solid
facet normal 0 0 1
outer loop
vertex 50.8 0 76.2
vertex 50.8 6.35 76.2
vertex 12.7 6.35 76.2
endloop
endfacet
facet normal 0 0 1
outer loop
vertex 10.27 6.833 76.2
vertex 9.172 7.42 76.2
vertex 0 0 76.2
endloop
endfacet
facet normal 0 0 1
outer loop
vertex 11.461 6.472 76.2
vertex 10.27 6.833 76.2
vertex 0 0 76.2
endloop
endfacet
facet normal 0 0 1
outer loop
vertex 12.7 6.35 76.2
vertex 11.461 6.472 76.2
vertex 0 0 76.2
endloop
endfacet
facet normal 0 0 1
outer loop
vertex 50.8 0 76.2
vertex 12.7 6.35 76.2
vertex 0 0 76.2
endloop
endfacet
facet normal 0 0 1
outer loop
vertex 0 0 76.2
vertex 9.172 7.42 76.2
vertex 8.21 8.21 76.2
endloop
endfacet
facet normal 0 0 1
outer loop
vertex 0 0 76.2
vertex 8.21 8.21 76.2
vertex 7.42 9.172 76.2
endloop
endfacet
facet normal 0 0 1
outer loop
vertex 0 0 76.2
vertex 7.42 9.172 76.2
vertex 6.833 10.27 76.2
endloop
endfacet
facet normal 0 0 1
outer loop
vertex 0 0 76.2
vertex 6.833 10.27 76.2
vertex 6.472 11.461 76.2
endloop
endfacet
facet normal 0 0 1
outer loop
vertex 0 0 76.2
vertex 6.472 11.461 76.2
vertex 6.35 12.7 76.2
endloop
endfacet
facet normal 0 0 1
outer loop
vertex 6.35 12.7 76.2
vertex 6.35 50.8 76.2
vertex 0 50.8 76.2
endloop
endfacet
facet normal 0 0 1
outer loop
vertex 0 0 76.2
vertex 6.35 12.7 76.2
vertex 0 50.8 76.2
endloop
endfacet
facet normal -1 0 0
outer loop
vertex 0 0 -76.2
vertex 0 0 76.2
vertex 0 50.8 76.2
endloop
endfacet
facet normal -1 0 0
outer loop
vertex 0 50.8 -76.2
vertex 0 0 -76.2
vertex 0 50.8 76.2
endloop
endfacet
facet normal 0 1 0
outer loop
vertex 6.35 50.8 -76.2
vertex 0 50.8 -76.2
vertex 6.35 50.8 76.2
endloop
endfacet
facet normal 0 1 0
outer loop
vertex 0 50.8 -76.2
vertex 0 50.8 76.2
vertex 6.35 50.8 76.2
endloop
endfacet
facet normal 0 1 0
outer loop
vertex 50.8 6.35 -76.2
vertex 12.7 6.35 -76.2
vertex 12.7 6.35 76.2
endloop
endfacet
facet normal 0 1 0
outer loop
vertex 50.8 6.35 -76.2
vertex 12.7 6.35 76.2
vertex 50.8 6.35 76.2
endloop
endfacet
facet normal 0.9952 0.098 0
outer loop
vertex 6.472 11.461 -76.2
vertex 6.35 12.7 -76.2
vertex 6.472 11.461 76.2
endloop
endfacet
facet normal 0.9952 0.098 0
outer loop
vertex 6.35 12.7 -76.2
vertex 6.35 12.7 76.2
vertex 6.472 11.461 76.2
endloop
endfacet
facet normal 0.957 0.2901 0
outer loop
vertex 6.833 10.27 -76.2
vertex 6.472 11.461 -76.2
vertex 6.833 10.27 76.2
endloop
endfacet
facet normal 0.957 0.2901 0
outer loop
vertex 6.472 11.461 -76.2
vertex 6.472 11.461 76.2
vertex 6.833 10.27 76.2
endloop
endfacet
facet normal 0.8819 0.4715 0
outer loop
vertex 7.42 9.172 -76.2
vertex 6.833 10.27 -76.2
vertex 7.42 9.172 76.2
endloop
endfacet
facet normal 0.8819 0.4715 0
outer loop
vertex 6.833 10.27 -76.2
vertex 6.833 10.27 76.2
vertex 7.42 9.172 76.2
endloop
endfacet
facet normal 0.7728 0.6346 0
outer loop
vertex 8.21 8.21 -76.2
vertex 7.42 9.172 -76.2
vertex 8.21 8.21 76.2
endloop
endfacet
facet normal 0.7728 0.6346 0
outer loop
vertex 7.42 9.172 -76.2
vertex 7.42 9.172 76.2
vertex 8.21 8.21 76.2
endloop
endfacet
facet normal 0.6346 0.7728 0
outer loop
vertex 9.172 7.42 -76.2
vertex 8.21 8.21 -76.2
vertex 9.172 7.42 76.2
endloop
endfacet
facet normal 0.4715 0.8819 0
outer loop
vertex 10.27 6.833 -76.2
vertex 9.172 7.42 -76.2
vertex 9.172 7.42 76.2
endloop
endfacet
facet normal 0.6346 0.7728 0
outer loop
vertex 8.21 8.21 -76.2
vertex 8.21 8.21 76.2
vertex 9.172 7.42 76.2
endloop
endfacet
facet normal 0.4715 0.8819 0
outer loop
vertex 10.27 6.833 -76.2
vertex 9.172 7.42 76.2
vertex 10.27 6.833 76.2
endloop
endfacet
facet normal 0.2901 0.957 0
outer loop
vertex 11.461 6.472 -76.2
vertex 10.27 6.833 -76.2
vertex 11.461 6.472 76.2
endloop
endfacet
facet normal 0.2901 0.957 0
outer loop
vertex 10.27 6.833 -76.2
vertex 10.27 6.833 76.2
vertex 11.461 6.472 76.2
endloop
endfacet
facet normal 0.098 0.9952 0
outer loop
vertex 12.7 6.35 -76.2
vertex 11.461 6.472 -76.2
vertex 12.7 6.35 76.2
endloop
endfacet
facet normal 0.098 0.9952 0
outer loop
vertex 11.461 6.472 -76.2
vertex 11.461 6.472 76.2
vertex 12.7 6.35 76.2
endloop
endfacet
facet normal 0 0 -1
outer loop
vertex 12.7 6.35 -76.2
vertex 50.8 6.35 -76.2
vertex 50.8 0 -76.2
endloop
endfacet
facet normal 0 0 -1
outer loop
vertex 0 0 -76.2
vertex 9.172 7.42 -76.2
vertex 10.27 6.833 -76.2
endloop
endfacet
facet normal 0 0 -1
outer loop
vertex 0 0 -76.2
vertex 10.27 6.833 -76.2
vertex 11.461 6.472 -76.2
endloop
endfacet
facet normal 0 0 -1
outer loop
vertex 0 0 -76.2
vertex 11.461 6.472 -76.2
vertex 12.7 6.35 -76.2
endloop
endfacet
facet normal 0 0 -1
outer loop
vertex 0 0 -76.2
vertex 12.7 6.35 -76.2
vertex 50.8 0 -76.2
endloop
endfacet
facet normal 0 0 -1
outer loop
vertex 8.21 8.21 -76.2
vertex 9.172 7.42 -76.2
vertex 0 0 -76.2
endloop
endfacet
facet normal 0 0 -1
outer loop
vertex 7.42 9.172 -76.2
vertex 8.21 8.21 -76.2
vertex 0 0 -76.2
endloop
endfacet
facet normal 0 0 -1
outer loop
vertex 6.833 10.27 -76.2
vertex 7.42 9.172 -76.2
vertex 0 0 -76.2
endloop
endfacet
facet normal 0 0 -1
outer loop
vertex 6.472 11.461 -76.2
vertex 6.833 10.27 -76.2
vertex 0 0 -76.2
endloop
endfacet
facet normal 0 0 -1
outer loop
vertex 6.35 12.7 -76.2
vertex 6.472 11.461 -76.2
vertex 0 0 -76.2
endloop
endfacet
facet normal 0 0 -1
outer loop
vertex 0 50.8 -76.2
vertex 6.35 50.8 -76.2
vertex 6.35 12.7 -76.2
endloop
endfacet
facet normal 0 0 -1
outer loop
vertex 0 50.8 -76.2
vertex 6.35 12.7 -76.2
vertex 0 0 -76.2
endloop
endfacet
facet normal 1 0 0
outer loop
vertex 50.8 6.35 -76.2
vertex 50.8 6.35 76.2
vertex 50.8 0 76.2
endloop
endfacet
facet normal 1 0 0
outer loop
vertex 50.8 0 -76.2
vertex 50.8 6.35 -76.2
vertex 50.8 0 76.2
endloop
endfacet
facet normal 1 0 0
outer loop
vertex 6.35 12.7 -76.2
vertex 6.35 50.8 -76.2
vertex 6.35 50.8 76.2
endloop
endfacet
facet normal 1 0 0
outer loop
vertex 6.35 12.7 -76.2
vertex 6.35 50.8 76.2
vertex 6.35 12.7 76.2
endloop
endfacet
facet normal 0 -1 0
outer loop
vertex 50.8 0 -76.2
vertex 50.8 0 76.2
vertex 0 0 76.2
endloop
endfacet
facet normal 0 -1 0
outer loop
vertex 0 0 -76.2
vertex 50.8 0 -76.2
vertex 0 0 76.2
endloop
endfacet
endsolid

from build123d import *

# Parameters (mm, degrees)
BOSS_EXTRUDE1_DEPTH = 76.2


with BuildPart() as part:
    # Sketch2 → Boss-Extrude1 (new body, symmetric)
    with BuildSketch(Plane.XY):
        with BuildLine():
            Line((0, 0), (0, 50.8))
            Line((0, 50.8), (6.35, 50.8))
            Line((6.35, 50.8), (6.35, 12.7))
            ThreePointArc((6.35, 12.7), (8.209871939, 8.209871939), (12.7, 6.35))
            Line((12.7, 6.35), (50.8, 6.35))
            Line((50.8, 6.35), (50.8, 0))
            Line((50.8, 0), (0, 0))
        make_face()
    extrude(amount=BOSS_EXTRUDE1_DEPTH, both=True)


solid = part.part
